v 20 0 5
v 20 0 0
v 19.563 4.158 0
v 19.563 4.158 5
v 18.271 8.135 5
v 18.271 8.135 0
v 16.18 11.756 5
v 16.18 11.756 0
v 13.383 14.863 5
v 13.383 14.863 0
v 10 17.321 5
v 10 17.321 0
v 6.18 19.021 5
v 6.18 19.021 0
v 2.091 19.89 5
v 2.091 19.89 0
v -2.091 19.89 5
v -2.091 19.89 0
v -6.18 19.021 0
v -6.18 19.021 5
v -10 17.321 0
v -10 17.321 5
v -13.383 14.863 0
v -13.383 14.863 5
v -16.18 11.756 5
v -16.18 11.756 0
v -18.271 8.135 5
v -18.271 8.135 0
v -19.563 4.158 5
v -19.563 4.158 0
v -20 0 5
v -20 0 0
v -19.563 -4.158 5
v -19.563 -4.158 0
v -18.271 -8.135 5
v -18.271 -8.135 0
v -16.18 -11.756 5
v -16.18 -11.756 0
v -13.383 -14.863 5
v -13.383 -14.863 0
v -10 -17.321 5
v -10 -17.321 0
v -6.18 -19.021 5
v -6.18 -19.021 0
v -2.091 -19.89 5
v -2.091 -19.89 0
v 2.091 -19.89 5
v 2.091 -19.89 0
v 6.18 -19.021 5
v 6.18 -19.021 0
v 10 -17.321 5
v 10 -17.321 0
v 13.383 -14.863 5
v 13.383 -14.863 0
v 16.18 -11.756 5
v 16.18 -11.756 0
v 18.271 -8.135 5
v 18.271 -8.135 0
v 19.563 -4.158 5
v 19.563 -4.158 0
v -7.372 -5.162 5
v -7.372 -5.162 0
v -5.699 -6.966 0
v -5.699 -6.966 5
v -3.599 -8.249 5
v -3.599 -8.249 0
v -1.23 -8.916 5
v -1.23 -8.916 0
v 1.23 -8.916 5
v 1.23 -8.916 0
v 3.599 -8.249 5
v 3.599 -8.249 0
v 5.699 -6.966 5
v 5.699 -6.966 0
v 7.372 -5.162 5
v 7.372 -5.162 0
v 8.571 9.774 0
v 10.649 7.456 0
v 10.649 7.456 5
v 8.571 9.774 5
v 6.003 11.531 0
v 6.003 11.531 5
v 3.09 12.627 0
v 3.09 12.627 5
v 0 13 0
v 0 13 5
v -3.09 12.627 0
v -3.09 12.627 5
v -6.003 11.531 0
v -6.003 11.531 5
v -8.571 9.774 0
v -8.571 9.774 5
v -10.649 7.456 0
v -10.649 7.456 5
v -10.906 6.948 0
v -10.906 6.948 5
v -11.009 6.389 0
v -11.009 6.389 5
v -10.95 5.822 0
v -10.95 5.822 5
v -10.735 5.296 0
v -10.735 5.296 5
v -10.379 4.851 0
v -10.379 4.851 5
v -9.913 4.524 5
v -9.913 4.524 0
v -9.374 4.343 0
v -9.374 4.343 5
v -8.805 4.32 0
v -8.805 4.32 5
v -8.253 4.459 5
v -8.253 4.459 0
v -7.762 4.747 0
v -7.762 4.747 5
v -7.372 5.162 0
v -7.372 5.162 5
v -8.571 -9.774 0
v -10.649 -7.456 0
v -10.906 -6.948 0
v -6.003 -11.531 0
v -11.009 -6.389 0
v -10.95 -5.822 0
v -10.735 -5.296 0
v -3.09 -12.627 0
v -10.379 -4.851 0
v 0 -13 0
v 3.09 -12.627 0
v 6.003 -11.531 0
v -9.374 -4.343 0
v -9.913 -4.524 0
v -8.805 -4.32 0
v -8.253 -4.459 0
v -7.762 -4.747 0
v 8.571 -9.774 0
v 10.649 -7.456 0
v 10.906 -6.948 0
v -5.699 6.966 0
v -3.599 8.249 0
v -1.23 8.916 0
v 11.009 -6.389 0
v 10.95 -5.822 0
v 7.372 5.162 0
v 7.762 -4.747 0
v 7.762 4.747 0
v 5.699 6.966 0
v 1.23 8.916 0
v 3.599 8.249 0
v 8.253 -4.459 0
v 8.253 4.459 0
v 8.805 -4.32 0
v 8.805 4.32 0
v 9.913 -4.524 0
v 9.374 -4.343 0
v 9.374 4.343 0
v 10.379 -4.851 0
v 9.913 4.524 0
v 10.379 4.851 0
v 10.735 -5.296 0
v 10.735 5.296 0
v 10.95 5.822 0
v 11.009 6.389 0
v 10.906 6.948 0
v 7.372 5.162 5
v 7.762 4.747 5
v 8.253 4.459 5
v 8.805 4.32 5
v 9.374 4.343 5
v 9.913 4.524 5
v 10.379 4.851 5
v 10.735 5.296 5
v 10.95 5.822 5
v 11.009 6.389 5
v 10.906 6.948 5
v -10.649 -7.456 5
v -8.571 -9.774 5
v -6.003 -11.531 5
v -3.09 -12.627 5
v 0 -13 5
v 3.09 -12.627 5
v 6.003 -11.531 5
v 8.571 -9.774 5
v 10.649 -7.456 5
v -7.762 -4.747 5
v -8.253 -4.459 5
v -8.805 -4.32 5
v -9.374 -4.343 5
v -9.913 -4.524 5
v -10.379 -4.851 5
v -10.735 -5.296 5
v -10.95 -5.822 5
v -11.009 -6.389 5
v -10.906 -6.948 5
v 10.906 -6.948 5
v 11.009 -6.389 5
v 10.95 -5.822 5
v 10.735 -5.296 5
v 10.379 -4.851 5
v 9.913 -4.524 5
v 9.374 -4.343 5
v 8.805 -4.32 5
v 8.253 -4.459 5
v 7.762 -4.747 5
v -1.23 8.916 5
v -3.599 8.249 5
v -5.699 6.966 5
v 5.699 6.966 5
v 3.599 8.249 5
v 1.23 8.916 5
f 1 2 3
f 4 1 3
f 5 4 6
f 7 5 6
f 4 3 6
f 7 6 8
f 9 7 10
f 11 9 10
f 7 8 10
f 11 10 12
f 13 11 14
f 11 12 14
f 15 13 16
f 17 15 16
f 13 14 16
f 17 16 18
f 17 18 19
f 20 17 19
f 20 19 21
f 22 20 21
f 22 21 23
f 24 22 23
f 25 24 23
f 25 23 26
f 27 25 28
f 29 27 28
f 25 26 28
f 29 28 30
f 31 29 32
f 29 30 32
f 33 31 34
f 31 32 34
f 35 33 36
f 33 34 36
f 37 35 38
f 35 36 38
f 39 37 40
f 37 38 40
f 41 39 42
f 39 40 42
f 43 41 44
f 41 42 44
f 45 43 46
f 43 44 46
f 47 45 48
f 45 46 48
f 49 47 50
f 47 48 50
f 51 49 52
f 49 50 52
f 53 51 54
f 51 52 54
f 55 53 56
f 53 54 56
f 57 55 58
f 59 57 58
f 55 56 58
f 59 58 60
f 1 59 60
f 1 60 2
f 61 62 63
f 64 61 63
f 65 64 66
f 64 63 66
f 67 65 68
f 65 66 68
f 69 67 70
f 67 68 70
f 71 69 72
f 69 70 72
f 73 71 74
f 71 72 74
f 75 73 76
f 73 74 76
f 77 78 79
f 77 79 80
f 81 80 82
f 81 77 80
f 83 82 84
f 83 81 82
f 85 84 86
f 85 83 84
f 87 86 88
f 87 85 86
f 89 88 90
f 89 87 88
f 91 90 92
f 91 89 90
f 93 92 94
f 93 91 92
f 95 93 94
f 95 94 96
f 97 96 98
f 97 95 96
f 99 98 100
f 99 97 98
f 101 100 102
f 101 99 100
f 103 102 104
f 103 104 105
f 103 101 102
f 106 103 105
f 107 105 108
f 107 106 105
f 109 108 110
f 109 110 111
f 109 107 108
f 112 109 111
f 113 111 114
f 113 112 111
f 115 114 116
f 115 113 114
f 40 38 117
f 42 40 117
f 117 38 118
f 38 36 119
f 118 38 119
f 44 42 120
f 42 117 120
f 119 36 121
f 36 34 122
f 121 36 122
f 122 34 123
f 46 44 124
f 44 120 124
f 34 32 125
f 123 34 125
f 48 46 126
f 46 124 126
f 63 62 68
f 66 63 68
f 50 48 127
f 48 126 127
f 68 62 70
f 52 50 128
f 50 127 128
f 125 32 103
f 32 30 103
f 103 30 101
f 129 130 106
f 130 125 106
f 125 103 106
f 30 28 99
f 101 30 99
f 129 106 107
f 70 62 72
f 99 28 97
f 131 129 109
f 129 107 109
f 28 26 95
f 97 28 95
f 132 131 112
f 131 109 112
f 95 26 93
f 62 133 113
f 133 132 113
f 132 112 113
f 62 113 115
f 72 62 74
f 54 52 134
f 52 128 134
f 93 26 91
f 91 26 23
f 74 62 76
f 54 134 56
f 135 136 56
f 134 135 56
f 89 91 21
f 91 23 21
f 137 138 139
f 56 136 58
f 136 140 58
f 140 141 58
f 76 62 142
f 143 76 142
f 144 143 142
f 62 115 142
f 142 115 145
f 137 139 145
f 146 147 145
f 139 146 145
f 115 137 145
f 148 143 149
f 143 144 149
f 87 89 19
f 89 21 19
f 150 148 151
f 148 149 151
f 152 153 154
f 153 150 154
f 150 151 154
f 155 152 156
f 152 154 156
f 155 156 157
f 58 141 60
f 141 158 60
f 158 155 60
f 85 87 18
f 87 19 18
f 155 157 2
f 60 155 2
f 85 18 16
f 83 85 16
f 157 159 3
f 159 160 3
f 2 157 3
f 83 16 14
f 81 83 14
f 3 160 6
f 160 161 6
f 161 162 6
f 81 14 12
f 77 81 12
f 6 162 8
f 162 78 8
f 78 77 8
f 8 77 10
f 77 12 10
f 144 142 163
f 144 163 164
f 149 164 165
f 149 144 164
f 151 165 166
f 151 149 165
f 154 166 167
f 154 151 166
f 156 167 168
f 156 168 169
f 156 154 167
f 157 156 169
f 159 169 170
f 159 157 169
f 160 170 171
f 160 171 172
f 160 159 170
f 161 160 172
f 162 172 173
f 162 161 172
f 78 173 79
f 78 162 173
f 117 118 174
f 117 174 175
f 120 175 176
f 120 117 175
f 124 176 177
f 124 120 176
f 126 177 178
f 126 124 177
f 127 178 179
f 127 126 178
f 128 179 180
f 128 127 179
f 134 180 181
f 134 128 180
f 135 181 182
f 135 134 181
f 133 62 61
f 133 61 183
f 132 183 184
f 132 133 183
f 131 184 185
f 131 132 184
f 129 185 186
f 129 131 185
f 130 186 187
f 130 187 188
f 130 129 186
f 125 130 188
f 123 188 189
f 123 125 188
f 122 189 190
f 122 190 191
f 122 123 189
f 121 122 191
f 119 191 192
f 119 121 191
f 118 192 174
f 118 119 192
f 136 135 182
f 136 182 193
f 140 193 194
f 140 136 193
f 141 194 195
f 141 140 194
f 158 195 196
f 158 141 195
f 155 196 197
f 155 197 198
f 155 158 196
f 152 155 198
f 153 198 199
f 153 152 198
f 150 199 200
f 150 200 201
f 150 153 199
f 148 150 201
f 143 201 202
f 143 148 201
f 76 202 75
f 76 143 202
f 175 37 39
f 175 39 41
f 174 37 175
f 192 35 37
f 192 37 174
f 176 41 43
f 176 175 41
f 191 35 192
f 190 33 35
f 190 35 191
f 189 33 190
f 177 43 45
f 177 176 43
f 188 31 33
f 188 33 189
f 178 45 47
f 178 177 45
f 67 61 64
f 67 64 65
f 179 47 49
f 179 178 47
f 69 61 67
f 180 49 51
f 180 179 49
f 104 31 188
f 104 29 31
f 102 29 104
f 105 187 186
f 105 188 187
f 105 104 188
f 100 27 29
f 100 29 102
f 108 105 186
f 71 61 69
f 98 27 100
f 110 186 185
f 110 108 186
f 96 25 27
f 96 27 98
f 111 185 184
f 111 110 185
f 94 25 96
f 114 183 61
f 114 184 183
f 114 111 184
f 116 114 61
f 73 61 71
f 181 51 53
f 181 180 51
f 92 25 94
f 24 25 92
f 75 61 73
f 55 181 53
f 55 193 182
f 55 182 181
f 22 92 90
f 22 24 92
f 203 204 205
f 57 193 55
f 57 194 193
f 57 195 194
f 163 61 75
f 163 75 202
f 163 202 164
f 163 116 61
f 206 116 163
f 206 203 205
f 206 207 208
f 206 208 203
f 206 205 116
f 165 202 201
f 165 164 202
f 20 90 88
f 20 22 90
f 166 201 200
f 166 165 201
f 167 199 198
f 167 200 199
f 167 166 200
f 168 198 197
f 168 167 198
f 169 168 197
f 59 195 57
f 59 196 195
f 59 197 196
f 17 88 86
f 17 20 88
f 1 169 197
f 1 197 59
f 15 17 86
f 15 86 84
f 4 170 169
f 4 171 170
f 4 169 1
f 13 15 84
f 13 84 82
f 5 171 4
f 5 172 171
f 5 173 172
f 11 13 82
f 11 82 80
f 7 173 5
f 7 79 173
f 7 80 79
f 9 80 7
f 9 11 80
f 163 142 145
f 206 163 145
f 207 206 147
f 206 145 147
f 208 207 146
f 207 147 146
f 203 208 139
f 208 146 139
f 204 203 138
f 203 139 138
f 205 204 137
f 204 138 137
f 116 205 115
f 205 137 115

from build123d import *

# Parameters (mm, degrees)
SKETCH_R      = 20
EXTRUDE_DEPTH = 5


with BuildPart() as part:
    # Sketch → Extrude (new body)
    with BuildSketch(Plane.XY):
        Circle(SKETCH_R)
        with BuildLine():
            ThreePointArc((7.372368, 5.162188), (0, 9), (-7.372368, 5.162188))
            ThreePointArc((-10.648977, 7.456494), (-10.157825, 4.671037), (-7.372368, 5.162188))
            ThreePointArc((10.648977, 7.456494), (0, 13), (-10.648977, 7.456494))
            ThreePointArc((7.372368, 5.162188), (10.157825, 4.671037), (10.648977, 7.456494))
        make_face(mode=Mode.SUBTRACT)
        with BuildLine():
            ThreePointArc((-7.372368, -5.162188), (0, -9), (7.372368, -5.162188))
            ThreePointArc((10.648977, -7.456494), (10.157825, -4.671037), (7.372368, -5.162188))
            ThreePointArc((-10.648977, -7.456494), (0, -13), (10.648977, -7.456494))
            ThreePointArc((-7.372368, -5.162188), (-10.157825, -4.671037), (-10.648977, -7.456494))
        make_face(mode=Mode.SUBTRACT)
    extrude(amount=EXTRUDE_DEPTH)


solid = part.part
